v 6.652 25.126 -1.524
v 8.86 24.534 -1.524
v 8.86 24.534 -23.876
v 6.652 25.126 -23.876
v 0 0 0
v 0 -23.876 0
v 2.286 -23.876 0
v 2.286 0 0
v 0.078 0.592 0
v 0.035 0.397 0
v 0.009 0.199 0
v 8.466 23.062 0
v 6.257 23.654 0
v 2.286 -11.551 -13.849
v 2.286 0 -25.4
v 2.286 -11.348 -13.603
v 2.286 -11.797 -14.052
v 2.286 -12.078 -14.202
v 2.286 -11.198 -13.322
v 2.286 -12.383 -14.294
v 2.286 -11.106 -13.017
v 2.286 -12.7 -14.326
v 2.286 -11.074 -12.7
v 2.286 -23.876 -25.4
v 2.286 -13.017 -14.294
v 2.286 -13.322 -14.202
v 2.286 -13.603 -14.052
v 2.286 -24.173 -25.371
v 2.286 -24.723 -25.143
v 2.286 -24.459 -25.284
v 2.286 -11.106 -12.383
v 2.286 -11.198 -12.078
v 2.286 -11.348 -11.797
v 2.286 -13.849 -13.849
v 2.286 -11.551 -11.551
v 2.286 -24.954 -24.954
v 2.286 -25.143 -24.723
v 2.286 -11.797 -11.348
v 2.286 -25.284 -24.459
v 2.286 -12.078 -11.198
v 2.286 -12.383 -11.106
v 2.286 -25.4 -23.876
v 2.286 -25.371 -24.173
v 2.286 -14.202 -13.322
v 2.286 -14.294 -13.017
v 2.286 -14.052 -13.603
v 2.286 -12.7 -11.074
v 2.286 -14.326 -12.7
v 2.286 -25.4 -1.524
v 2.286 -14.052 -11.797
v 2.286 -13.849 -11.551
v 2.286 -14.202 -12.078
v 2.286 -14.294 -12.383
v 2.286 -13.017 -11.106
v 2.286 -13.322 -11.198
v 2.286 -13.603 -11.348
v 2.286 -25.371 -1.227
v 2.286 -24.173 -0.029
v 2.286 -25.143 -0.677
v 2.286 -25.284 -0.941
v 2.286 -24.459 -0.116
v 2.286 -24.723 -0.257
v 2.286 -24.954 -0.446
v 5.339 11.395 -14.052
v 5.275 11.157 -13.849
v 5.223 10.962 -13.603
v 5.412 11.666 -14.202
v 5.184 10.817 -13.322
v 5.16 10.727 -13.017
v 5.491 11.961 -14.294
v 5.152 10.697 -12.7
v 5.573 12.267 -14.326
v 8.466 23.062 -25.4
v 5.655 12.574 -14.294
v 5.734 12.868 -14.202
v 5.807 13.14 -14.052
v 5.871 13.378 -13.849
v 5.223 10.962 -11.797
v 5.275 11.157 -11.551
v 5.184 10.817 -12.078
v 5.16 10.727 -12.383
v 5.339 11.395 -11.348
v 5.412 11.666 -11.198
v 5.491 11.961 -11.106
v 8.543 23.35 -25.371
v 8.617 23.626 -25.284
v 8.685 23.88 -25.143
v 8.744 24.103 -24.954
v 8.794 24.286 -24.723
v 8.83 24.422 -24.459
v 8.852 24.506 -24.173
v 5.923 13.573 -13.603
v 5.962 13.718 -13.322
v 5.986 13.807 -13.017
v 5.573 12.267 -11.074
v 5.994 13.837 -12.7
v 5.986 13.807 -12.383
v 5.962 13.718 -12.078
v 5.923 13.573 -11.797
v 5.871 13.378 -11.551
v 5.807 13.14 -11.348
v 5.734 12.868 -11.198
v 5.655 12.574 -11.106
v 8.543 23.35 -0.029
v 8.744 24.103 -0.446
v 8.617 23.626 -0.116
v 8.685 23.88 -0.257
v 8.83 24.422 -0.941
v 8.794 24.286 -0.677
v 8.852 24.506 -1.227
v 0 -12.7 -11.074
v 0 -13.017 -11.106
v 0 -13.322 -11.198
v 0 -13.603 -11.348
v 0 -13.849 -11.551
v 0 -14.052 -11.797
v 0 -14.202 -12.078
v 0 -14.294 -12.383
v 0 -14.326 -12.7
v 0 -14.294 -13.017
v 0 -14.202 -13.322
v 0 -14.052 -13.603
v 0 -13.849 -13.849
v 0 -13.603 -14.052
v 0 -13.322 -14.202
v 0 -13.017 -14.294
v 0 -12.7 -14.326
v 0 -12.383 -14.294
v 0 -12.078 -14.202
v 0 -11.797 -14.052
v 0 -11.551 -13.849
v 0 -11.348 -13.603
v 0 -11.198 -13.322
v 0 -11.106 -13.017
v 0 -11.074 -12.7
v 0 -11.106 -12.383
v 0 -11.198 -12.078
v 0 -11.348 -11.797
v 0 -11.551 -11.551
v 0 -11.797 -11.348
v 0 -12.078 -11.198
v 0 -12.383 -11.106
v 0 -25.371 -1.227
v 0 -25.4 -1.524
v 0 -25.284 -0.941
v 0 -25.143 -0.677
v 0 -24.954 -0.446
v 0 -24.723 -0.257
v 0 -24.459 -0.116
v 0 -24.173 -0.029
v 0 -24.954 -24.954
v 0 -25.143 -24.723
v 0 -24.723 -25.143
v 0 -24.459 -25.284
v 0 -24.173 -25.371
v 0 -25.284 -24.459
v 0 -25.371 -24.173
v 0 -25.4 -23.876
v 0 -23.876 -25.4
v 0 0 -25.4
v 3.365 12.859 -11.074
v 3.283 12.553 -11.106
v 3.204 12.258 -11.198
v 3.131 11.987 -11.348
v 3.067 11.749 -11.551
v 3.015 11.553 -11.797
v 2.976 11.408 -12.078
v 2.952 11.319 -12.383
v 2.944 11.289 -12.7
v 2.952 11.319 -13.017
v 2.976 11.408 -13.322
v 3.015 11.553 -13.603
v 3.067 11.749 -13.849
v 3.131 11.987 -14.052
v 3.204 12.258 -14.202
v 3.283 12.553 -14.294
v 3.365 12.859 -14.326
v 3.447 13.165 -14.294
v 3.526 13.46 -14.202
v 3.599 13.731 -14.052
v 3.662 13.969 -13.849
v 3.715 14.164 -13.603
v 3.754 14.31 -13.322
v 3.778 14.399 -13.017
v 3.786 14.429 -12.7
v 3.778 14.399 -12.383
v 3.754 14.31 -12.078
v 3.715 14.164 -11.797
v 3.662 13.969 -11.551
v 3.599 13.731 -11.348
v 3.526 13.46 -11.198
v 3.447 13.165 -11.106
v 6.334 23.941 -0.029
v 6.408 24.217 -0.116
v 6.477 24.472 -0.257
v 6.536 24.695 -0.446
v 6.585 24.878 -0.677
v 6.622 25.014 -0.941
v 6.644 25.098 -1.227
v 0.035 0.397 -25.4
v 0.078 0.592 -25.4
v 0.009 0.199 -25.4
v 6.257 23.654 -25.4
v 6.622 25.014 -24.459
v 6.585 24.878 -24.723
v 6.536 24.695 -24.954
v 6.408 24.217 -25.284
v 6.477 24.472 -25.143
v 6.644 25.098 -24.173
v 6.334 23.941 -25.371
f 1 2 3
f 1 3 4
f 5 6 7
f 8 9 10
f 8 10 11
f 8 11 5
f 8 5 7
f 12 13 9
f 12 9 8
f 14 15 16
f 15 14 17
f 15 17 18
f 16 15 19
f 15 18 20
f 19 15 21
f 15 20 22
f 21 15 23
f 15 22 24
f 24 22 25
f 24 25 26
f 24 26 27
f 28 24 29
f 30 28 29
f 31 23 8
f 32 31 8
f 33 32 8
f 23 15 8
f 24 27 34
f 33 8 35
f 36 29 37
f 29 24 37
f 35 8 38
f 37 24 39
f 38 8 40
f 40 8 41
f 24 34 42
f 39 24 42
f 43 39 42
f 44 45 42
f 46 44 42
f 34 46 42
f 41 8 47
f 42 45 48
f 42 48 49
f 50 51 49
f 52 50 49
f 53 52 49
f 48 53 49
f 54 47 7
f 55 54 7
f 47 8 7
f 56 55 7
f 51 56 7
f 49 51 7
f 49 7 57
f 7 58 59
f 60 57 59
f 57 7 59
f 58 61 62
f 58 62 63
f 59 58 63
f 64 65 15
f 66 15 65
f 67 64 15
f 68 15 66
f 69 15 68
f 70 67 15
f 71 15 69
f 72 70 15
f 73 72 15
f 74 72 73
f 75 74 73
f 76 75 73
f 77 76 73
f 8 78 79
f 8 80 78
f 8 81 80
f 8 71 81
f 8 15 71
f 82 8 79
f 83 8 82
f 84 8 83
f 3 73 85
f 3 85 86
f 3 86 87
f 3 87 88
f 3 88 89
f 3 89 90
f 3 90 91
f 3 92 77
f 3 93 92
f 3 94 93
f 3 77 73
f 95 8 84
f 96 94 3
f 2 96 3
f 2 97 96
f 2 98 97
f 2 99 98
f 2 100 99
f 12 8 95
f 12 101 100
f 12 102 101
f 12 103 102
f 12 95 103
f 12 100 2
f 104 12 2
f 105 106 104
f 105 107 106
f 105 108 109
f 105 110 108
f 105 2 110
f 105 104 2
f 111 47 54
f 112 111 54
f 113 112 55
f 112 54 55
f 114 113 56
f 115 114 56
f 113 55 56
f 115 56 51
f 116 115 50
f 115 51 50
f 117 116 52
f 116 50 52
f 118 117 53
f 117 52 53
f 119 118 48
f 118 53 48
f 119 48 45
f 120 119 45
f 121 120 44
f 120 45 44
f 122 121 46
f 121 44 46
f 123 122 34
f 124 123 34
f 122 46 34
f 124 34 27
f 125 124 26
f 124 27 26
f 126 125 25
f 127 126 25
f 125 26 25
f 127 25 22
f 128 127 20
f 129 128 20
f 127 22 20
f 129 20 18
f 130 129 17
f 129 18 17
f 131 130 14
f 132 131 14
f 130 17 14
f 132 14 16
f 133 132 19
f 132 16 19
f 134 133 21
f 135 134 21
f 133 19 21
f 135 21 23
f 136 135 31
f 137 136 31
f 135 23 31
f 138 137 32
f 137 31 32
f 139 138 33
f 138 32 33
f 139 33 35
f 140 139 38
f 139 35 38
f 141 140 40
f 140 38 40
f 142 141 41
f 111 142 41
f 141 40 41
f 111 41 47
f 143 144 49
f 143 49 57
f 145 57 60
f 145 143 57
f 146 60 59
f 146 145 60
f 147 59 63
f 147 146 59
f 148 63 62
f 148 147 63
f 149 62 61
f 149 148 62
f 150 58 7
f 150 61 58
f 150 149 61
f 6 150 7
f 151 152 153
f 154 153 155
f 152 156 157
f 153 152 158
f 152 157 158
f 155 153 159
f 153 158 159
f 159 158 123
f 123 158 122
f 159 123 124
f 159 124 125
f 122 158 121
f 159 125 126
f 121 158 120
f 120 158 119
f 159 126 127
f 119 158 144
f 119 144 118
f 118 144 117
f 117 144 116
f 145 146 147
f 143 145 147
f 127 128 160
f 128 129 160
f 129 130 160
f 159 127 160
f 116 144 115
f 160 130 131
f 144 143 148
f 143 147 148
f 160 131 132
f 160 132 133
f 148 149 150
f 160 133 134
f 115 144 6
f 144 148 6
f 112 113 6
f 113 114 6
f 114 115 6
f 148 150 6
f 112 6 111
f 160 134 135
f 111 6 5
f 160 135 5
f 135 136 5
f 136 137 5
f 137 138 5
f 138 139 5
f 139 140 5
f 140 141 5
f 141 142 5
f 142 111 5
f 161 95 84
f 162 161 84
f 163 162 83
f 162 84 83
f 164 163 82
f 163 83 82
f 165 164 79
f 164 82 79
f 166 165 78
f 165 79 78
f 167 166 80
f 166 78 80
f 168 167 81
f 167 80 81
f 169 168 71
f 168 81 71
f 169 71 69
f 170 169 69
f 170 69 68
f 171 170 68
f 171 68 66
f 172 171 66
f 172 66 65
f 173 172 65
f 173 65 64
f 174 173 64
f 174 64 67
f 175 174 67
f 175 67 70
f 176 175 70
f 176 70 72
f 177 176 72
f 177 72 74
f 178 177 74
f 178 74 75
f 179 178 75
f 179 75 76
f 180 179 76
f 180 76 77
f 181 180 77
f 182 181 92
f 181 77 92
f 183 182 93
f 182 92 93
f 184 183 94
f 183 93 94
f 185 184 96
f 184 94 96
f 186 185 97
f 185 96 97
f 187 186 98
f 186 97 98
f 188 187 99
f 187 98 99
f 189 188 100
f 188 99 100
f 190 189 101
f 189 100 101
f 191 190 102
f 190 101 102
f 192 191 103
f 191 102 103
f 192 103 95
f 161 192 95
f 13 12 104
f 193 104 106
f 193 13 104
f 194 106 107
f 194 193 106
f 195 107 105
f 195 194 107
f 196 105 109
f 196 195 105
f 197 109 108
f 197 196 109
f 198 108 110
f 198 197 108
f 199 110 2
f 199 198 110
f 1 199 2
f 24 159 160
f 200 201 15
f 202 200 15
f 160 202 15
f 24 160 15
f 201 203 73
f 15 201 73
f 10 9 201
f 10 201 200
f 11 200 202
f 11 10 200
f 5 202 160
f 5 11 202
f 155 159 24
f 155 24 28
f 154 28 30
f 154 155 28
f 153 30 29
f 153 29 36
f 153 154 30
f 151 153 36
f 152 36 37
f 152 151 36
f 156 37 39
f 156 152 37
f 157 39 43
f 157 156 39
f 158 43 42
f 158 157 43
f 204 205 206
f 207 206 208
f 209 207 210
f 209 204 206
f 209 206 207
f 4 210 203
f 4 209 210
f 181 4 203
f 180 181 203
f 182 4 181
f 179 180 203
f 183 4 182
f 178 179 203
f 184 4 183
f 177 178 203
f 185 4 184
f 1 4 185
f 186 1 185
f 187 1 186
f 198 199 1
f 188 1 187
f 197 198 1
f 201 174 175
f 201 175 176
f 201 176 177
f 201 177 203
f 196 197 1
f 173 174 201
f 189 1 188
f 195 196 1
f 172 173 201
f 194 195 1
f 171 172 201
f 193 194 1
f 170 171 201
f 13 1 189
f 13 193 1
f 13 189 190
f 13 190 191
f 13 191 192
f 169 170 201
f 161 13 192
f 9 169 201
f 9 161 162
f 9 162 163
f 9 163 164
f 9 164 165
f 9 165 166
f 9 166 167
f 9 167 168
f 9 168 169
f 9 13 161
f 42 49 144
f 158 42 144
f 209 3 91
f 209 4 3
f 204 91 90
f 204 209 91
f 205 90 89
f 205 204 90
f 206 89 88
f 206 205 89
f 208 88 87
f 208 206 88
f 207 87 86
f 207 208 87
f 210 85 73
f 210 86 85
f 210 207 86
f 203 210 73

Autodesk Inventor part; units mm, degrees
ref_plane "YZ Plane" through (0, 0, 0) normal (1, 0, 0) x (0, 1, 0)
ref_plane "XZ Plane" through (0, 0, 0) normal (0, 1, 0) x (-1, 0, 0)
ref_plane "XY Plane" through (0, 0, 0) normal (0, 0, 1) x (1, 0, 0)
sketch "Sketch4" plane through (0, 0, 0) normal (0, 0, 1) x (1, 0, 0)
  line L0 (0, 0) -> (2.286, 0)
  line L1 (2.286, 0) -> (2.286, -25.4)
  line L2 (2.286, -25.4) -> (0, -25.4)
  line L3 (0, -25.4) -> (0, 0)
  line L4 (2.286, 0) -> (27.686, 0) construction
  line L5 (0.0779, 0.5917) -> (2.286, 0)
  arc A0 (0.0779, 0.5917) -> (0, 0) centre (2.286, 0) ccw
  line L6 (2.286, 0) -> (8.86, 24.5345)
  line L7 (2.286, 0) -> (27.686, 0) construction
  line L8 (8.86, 24.5345) -> (6.6519, 25.1262)
  line L9 (6.6519, 25.1262) -> (0.0779, 0.5917)
  dimension "d14" = 2.286
  dimension "d15" = 25.4
  dimension "d20" = 25.4
  dimension "d21" = 75
  dimension "d22" = 2.286
  dimension "d23" = 90
extrude "Extrusion2" add sketch "Sketch4" against normal blind 25.4
sketch "Sketch5" plane through (6.6519, 25.1262, -25.4) normal (-0.9659258, 0.258819, 0) x (0, 0, 1)
  line L0 (25.4, 0) -> (0, 0) projected
  line L1 (25.4, -25.4) -> (0, -25.4) projected
  point P0 (25.4, -25.9917)
  point P1 (12.7, -12.7)
  point P2 (12.7, 0)
  dimension "d26" = 12.7
sketch "Sketch6" plane through (0, -25.4, 0) normal (-1, 0, 0) x (0, 0, 1)
  line L0 (0, 0) -> (-25.4, 0) projected
  line L1 (0, 25.4) -> (-25.4, 25.4) projected
  point P0 (-12.7, 12.7)
  point P1 (-12.7, 0)
  dimension "d27" = 12.7
hole "Hole2" at (3.3649, 12.8589, -12.7) direction (0.9659258, -0.258819, 0) diameter 3.2512 end through all
hole "Hole3" at (0, -12.7, -12.7) direction (1, 0, 0) diameter 3.2512 end through all
fillet "Fillet2" radius 1.524 4 edges at (7.756, 24.8303, 0) (7.756, 24.8303, -25.4) (1.143, -25.4, -25.4) (1.143, -25.4, 0)
properties part number "am-2847" material "Steel"
